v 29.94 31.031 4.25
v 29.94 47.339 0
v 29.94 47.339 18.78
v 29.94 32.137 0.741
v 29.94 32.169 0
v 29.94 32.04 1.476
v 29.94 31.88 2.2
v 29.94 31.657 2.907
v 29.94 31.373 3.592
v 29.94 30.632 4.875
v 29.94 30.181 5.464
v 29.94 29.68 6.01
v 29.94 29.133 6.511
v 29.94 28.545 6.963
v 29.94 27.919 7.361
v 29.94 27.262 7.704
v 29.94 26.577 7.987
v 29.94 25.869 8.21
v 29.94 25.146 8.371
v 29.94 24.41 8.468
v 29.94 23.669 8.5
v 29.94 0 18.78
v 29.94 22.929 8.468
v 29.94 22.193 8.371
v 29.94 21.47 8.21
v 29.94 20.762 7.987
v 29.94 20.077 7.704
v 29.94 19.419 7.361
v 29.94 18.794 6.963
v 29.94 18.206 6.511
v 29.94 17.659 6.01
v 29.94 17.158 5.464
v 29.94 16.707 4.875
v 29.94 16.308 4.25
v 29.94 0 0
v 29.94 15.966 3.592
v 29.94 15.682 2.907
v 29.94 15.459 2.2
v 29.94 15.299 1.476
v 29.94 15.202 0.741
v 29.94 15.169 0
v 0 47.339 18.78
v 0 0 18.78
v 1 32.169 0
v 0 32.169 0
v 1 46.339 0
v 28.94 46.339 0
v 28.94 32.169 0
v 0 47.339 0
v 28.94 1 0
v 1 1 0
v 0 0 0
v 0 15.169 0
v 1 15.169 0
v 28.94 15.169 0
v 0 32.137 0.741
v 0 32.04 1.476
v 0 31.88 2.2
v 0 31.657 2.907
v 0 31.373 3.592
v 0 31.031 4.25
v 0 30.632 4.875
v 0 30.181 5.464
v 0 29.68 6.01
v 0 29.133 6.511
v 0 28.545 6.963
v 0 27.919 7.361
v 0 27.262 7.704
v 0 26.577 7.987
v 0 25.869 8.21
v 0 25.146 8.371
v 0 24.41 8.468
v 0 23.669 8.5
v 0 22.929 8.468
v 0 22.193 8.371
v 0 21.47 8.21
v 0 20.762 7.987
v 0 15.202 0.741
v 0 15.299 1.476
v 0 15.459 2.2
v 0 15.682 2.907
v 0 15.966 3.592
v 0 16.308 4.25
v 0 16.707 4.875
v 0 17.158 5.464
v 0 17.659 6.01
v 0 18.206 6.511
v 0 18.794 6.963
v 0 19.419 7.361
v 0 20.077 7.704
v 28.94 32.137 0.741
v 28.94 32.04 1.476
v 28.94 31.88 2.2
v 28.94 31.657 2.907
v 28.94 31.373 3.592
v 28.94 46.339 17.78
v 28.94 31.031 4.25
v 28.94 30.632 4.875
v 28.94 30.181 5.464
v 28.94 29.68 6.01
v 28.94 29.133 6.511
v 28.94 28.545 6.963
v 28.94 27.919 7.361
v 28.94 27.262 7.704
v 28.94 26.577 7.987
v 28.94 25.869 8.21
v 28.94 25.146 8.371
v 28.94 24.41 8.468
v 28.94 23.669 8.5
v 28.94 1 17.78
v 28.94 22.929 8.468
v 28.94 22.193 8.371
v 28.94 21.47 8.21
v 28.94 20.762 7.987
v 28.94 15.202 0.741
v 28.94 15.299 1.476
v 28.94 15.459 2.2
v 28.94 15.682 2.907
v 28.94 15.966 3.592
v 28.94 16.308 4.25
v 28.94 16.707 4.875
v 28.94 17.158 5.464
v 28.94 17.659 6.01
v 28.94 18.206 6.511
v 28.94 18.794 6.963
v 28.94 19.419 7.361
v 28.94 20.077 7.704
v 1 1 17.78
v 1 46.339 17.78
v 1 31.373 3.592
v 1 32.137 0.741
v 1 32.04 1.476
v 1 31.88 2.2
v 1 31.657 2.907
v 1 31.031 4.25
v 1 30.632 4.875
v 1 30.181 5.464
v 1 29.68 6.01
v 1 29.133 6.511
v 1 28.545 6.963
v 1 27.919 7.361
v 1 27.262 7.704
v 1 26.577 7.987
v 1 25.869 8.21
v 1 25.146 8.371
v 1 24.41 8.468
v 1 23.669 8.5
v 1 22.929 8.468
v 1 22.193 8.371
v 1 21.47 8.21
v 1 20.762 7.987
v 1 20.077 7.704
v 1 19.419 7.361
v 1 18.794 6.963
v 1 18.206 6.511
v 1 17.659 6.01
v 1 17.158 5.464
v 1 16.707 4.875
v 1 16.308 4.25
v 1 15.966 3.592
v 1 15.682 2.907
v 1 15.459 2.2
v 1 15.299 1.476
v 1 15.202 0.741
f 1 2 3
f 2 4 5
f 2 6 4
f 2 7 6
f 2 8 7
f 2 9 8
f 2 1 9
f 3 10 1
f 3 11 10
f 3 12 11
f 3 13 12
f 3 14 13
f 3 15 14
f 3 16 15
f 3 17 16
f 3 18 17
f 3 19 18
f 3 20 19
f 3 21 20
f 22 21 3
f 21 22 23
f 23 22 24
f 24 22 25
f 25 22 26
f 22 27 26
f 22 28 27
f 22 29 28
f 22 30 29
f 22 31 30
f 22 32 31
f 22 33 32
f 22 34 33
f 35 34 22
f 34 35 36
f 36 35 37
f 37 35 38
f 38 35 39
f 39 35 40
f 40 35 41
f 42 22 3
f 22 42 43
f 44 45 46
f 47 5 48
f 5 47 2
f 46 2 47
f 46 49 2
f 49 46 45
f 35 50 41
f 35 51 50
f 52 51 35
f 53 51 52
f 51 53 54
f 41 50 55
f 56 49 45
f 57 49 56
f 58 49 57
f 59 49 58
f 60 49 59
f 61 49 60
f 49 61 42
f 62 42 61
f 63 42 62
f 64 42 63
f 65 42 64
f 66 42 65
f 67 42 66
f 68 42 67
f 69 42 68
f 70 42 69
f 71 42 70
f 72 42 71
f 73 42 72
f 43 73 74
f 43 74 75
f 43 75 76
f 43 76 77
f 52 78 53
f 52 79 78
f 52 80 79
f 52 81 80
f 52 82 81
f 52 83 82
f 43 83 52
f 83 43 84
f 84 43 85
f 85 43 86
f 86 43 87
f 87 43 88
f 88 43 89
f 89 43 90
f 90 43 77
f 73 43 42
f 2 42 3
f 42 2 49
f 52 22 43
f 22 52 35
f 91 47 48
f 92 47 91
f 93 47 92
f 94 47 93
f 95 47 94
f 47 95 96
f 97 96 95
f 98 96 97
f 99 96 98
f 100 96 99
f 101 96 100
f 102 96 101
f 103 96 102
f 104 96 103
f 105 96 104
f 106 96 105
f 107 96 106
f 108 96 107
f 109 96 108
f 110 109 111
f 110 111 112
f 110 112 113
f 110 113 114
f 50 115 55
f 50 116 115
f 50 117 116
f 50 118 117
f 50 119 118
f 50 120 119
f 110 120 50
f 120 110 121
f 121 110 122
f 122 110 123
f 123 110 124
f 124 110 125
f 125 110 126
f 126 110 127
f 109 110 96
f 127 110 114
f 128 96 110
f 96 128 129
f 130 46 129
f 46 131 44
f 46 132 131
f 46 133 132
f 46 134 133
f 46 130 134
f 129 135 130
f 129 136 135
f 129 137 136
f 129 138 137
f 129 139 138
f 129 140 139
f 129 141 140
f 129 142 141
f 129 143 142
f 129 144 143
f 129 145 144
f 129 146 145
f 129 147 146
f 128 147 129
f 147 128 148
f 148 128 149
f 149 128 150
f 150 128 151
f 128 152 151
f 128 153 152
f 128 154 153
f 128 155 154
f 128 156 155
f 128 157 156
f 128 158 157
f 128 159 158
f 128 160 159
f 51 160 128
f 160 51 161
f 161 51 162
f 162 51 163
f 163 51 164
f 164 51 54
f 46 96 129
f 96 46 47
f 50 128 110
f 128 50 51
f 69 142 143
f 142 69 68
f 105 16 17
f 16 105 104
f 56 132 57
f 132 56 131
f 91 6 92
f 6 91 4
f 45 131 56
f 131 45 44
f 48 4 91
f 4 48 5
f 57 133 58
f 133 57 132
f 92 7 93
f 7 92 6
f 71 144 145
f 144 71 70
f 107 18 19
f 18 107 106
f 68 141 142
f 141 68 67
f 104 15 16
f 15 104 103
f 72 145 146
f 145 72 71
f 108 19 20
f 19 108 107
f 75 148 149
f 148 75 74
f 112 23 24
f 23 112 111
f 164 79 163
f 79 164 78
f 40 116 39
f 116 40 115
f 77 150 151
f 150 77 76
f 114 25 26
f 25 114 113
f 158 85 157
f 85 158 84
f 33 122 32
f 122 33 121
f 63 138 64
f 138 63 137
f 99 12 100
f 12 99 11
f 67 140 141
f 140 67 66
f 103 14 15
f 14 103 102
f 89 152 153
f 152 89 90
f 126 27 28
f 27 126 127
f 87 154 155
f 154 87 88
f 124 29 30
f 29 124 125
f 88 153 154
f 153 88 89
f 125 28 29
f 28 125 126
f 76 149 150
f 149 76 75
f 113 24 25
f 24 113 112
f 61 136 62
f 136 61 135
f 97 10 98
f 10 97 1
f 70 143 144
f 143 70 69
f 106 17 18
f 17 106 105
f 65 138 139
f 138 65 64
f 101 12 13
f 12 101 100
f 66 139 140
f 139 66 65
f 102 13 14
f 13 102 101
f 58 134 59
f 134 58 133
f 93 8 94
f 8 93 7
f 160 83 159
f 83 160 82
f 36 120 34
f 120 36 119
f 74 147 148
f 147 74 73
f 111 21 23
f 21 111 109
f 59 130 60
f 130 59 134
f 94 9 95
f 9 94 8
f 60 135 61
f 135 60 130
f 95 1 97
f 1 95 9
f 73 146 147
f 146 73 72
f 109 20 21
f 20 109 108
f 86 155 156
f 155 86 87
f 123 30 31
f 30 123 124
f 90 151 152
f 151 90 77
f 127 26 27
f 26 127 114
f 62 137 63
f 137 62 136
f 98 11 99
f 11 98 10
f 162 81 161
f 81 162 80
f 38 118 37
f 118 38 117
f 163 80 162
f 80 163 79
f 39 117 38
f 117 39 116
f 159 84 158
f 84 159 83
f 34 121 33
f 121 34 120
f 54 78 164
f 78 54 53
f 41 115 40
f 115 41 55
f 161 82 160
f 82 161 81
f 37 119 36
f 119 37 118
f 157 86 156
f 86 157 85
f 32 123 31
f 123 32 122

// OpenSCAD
p=3.175;
o=4.175;
bx=21.59;
by=38.989;
bz=14.605;

difference() {
	cube([bx+2*o,by+2*o,bz+o]);
	translate([1,1,-1]){
		cube([bx+2*p, by+2*p, bz+p+1]);
	}
	translate([-5, by/2+o, 0]) {
		rotate([90, 0, 90]) {
			cylinder(h=40, r=8.5, ,$fa=5, $fs=0.1);
		}
	}
}
